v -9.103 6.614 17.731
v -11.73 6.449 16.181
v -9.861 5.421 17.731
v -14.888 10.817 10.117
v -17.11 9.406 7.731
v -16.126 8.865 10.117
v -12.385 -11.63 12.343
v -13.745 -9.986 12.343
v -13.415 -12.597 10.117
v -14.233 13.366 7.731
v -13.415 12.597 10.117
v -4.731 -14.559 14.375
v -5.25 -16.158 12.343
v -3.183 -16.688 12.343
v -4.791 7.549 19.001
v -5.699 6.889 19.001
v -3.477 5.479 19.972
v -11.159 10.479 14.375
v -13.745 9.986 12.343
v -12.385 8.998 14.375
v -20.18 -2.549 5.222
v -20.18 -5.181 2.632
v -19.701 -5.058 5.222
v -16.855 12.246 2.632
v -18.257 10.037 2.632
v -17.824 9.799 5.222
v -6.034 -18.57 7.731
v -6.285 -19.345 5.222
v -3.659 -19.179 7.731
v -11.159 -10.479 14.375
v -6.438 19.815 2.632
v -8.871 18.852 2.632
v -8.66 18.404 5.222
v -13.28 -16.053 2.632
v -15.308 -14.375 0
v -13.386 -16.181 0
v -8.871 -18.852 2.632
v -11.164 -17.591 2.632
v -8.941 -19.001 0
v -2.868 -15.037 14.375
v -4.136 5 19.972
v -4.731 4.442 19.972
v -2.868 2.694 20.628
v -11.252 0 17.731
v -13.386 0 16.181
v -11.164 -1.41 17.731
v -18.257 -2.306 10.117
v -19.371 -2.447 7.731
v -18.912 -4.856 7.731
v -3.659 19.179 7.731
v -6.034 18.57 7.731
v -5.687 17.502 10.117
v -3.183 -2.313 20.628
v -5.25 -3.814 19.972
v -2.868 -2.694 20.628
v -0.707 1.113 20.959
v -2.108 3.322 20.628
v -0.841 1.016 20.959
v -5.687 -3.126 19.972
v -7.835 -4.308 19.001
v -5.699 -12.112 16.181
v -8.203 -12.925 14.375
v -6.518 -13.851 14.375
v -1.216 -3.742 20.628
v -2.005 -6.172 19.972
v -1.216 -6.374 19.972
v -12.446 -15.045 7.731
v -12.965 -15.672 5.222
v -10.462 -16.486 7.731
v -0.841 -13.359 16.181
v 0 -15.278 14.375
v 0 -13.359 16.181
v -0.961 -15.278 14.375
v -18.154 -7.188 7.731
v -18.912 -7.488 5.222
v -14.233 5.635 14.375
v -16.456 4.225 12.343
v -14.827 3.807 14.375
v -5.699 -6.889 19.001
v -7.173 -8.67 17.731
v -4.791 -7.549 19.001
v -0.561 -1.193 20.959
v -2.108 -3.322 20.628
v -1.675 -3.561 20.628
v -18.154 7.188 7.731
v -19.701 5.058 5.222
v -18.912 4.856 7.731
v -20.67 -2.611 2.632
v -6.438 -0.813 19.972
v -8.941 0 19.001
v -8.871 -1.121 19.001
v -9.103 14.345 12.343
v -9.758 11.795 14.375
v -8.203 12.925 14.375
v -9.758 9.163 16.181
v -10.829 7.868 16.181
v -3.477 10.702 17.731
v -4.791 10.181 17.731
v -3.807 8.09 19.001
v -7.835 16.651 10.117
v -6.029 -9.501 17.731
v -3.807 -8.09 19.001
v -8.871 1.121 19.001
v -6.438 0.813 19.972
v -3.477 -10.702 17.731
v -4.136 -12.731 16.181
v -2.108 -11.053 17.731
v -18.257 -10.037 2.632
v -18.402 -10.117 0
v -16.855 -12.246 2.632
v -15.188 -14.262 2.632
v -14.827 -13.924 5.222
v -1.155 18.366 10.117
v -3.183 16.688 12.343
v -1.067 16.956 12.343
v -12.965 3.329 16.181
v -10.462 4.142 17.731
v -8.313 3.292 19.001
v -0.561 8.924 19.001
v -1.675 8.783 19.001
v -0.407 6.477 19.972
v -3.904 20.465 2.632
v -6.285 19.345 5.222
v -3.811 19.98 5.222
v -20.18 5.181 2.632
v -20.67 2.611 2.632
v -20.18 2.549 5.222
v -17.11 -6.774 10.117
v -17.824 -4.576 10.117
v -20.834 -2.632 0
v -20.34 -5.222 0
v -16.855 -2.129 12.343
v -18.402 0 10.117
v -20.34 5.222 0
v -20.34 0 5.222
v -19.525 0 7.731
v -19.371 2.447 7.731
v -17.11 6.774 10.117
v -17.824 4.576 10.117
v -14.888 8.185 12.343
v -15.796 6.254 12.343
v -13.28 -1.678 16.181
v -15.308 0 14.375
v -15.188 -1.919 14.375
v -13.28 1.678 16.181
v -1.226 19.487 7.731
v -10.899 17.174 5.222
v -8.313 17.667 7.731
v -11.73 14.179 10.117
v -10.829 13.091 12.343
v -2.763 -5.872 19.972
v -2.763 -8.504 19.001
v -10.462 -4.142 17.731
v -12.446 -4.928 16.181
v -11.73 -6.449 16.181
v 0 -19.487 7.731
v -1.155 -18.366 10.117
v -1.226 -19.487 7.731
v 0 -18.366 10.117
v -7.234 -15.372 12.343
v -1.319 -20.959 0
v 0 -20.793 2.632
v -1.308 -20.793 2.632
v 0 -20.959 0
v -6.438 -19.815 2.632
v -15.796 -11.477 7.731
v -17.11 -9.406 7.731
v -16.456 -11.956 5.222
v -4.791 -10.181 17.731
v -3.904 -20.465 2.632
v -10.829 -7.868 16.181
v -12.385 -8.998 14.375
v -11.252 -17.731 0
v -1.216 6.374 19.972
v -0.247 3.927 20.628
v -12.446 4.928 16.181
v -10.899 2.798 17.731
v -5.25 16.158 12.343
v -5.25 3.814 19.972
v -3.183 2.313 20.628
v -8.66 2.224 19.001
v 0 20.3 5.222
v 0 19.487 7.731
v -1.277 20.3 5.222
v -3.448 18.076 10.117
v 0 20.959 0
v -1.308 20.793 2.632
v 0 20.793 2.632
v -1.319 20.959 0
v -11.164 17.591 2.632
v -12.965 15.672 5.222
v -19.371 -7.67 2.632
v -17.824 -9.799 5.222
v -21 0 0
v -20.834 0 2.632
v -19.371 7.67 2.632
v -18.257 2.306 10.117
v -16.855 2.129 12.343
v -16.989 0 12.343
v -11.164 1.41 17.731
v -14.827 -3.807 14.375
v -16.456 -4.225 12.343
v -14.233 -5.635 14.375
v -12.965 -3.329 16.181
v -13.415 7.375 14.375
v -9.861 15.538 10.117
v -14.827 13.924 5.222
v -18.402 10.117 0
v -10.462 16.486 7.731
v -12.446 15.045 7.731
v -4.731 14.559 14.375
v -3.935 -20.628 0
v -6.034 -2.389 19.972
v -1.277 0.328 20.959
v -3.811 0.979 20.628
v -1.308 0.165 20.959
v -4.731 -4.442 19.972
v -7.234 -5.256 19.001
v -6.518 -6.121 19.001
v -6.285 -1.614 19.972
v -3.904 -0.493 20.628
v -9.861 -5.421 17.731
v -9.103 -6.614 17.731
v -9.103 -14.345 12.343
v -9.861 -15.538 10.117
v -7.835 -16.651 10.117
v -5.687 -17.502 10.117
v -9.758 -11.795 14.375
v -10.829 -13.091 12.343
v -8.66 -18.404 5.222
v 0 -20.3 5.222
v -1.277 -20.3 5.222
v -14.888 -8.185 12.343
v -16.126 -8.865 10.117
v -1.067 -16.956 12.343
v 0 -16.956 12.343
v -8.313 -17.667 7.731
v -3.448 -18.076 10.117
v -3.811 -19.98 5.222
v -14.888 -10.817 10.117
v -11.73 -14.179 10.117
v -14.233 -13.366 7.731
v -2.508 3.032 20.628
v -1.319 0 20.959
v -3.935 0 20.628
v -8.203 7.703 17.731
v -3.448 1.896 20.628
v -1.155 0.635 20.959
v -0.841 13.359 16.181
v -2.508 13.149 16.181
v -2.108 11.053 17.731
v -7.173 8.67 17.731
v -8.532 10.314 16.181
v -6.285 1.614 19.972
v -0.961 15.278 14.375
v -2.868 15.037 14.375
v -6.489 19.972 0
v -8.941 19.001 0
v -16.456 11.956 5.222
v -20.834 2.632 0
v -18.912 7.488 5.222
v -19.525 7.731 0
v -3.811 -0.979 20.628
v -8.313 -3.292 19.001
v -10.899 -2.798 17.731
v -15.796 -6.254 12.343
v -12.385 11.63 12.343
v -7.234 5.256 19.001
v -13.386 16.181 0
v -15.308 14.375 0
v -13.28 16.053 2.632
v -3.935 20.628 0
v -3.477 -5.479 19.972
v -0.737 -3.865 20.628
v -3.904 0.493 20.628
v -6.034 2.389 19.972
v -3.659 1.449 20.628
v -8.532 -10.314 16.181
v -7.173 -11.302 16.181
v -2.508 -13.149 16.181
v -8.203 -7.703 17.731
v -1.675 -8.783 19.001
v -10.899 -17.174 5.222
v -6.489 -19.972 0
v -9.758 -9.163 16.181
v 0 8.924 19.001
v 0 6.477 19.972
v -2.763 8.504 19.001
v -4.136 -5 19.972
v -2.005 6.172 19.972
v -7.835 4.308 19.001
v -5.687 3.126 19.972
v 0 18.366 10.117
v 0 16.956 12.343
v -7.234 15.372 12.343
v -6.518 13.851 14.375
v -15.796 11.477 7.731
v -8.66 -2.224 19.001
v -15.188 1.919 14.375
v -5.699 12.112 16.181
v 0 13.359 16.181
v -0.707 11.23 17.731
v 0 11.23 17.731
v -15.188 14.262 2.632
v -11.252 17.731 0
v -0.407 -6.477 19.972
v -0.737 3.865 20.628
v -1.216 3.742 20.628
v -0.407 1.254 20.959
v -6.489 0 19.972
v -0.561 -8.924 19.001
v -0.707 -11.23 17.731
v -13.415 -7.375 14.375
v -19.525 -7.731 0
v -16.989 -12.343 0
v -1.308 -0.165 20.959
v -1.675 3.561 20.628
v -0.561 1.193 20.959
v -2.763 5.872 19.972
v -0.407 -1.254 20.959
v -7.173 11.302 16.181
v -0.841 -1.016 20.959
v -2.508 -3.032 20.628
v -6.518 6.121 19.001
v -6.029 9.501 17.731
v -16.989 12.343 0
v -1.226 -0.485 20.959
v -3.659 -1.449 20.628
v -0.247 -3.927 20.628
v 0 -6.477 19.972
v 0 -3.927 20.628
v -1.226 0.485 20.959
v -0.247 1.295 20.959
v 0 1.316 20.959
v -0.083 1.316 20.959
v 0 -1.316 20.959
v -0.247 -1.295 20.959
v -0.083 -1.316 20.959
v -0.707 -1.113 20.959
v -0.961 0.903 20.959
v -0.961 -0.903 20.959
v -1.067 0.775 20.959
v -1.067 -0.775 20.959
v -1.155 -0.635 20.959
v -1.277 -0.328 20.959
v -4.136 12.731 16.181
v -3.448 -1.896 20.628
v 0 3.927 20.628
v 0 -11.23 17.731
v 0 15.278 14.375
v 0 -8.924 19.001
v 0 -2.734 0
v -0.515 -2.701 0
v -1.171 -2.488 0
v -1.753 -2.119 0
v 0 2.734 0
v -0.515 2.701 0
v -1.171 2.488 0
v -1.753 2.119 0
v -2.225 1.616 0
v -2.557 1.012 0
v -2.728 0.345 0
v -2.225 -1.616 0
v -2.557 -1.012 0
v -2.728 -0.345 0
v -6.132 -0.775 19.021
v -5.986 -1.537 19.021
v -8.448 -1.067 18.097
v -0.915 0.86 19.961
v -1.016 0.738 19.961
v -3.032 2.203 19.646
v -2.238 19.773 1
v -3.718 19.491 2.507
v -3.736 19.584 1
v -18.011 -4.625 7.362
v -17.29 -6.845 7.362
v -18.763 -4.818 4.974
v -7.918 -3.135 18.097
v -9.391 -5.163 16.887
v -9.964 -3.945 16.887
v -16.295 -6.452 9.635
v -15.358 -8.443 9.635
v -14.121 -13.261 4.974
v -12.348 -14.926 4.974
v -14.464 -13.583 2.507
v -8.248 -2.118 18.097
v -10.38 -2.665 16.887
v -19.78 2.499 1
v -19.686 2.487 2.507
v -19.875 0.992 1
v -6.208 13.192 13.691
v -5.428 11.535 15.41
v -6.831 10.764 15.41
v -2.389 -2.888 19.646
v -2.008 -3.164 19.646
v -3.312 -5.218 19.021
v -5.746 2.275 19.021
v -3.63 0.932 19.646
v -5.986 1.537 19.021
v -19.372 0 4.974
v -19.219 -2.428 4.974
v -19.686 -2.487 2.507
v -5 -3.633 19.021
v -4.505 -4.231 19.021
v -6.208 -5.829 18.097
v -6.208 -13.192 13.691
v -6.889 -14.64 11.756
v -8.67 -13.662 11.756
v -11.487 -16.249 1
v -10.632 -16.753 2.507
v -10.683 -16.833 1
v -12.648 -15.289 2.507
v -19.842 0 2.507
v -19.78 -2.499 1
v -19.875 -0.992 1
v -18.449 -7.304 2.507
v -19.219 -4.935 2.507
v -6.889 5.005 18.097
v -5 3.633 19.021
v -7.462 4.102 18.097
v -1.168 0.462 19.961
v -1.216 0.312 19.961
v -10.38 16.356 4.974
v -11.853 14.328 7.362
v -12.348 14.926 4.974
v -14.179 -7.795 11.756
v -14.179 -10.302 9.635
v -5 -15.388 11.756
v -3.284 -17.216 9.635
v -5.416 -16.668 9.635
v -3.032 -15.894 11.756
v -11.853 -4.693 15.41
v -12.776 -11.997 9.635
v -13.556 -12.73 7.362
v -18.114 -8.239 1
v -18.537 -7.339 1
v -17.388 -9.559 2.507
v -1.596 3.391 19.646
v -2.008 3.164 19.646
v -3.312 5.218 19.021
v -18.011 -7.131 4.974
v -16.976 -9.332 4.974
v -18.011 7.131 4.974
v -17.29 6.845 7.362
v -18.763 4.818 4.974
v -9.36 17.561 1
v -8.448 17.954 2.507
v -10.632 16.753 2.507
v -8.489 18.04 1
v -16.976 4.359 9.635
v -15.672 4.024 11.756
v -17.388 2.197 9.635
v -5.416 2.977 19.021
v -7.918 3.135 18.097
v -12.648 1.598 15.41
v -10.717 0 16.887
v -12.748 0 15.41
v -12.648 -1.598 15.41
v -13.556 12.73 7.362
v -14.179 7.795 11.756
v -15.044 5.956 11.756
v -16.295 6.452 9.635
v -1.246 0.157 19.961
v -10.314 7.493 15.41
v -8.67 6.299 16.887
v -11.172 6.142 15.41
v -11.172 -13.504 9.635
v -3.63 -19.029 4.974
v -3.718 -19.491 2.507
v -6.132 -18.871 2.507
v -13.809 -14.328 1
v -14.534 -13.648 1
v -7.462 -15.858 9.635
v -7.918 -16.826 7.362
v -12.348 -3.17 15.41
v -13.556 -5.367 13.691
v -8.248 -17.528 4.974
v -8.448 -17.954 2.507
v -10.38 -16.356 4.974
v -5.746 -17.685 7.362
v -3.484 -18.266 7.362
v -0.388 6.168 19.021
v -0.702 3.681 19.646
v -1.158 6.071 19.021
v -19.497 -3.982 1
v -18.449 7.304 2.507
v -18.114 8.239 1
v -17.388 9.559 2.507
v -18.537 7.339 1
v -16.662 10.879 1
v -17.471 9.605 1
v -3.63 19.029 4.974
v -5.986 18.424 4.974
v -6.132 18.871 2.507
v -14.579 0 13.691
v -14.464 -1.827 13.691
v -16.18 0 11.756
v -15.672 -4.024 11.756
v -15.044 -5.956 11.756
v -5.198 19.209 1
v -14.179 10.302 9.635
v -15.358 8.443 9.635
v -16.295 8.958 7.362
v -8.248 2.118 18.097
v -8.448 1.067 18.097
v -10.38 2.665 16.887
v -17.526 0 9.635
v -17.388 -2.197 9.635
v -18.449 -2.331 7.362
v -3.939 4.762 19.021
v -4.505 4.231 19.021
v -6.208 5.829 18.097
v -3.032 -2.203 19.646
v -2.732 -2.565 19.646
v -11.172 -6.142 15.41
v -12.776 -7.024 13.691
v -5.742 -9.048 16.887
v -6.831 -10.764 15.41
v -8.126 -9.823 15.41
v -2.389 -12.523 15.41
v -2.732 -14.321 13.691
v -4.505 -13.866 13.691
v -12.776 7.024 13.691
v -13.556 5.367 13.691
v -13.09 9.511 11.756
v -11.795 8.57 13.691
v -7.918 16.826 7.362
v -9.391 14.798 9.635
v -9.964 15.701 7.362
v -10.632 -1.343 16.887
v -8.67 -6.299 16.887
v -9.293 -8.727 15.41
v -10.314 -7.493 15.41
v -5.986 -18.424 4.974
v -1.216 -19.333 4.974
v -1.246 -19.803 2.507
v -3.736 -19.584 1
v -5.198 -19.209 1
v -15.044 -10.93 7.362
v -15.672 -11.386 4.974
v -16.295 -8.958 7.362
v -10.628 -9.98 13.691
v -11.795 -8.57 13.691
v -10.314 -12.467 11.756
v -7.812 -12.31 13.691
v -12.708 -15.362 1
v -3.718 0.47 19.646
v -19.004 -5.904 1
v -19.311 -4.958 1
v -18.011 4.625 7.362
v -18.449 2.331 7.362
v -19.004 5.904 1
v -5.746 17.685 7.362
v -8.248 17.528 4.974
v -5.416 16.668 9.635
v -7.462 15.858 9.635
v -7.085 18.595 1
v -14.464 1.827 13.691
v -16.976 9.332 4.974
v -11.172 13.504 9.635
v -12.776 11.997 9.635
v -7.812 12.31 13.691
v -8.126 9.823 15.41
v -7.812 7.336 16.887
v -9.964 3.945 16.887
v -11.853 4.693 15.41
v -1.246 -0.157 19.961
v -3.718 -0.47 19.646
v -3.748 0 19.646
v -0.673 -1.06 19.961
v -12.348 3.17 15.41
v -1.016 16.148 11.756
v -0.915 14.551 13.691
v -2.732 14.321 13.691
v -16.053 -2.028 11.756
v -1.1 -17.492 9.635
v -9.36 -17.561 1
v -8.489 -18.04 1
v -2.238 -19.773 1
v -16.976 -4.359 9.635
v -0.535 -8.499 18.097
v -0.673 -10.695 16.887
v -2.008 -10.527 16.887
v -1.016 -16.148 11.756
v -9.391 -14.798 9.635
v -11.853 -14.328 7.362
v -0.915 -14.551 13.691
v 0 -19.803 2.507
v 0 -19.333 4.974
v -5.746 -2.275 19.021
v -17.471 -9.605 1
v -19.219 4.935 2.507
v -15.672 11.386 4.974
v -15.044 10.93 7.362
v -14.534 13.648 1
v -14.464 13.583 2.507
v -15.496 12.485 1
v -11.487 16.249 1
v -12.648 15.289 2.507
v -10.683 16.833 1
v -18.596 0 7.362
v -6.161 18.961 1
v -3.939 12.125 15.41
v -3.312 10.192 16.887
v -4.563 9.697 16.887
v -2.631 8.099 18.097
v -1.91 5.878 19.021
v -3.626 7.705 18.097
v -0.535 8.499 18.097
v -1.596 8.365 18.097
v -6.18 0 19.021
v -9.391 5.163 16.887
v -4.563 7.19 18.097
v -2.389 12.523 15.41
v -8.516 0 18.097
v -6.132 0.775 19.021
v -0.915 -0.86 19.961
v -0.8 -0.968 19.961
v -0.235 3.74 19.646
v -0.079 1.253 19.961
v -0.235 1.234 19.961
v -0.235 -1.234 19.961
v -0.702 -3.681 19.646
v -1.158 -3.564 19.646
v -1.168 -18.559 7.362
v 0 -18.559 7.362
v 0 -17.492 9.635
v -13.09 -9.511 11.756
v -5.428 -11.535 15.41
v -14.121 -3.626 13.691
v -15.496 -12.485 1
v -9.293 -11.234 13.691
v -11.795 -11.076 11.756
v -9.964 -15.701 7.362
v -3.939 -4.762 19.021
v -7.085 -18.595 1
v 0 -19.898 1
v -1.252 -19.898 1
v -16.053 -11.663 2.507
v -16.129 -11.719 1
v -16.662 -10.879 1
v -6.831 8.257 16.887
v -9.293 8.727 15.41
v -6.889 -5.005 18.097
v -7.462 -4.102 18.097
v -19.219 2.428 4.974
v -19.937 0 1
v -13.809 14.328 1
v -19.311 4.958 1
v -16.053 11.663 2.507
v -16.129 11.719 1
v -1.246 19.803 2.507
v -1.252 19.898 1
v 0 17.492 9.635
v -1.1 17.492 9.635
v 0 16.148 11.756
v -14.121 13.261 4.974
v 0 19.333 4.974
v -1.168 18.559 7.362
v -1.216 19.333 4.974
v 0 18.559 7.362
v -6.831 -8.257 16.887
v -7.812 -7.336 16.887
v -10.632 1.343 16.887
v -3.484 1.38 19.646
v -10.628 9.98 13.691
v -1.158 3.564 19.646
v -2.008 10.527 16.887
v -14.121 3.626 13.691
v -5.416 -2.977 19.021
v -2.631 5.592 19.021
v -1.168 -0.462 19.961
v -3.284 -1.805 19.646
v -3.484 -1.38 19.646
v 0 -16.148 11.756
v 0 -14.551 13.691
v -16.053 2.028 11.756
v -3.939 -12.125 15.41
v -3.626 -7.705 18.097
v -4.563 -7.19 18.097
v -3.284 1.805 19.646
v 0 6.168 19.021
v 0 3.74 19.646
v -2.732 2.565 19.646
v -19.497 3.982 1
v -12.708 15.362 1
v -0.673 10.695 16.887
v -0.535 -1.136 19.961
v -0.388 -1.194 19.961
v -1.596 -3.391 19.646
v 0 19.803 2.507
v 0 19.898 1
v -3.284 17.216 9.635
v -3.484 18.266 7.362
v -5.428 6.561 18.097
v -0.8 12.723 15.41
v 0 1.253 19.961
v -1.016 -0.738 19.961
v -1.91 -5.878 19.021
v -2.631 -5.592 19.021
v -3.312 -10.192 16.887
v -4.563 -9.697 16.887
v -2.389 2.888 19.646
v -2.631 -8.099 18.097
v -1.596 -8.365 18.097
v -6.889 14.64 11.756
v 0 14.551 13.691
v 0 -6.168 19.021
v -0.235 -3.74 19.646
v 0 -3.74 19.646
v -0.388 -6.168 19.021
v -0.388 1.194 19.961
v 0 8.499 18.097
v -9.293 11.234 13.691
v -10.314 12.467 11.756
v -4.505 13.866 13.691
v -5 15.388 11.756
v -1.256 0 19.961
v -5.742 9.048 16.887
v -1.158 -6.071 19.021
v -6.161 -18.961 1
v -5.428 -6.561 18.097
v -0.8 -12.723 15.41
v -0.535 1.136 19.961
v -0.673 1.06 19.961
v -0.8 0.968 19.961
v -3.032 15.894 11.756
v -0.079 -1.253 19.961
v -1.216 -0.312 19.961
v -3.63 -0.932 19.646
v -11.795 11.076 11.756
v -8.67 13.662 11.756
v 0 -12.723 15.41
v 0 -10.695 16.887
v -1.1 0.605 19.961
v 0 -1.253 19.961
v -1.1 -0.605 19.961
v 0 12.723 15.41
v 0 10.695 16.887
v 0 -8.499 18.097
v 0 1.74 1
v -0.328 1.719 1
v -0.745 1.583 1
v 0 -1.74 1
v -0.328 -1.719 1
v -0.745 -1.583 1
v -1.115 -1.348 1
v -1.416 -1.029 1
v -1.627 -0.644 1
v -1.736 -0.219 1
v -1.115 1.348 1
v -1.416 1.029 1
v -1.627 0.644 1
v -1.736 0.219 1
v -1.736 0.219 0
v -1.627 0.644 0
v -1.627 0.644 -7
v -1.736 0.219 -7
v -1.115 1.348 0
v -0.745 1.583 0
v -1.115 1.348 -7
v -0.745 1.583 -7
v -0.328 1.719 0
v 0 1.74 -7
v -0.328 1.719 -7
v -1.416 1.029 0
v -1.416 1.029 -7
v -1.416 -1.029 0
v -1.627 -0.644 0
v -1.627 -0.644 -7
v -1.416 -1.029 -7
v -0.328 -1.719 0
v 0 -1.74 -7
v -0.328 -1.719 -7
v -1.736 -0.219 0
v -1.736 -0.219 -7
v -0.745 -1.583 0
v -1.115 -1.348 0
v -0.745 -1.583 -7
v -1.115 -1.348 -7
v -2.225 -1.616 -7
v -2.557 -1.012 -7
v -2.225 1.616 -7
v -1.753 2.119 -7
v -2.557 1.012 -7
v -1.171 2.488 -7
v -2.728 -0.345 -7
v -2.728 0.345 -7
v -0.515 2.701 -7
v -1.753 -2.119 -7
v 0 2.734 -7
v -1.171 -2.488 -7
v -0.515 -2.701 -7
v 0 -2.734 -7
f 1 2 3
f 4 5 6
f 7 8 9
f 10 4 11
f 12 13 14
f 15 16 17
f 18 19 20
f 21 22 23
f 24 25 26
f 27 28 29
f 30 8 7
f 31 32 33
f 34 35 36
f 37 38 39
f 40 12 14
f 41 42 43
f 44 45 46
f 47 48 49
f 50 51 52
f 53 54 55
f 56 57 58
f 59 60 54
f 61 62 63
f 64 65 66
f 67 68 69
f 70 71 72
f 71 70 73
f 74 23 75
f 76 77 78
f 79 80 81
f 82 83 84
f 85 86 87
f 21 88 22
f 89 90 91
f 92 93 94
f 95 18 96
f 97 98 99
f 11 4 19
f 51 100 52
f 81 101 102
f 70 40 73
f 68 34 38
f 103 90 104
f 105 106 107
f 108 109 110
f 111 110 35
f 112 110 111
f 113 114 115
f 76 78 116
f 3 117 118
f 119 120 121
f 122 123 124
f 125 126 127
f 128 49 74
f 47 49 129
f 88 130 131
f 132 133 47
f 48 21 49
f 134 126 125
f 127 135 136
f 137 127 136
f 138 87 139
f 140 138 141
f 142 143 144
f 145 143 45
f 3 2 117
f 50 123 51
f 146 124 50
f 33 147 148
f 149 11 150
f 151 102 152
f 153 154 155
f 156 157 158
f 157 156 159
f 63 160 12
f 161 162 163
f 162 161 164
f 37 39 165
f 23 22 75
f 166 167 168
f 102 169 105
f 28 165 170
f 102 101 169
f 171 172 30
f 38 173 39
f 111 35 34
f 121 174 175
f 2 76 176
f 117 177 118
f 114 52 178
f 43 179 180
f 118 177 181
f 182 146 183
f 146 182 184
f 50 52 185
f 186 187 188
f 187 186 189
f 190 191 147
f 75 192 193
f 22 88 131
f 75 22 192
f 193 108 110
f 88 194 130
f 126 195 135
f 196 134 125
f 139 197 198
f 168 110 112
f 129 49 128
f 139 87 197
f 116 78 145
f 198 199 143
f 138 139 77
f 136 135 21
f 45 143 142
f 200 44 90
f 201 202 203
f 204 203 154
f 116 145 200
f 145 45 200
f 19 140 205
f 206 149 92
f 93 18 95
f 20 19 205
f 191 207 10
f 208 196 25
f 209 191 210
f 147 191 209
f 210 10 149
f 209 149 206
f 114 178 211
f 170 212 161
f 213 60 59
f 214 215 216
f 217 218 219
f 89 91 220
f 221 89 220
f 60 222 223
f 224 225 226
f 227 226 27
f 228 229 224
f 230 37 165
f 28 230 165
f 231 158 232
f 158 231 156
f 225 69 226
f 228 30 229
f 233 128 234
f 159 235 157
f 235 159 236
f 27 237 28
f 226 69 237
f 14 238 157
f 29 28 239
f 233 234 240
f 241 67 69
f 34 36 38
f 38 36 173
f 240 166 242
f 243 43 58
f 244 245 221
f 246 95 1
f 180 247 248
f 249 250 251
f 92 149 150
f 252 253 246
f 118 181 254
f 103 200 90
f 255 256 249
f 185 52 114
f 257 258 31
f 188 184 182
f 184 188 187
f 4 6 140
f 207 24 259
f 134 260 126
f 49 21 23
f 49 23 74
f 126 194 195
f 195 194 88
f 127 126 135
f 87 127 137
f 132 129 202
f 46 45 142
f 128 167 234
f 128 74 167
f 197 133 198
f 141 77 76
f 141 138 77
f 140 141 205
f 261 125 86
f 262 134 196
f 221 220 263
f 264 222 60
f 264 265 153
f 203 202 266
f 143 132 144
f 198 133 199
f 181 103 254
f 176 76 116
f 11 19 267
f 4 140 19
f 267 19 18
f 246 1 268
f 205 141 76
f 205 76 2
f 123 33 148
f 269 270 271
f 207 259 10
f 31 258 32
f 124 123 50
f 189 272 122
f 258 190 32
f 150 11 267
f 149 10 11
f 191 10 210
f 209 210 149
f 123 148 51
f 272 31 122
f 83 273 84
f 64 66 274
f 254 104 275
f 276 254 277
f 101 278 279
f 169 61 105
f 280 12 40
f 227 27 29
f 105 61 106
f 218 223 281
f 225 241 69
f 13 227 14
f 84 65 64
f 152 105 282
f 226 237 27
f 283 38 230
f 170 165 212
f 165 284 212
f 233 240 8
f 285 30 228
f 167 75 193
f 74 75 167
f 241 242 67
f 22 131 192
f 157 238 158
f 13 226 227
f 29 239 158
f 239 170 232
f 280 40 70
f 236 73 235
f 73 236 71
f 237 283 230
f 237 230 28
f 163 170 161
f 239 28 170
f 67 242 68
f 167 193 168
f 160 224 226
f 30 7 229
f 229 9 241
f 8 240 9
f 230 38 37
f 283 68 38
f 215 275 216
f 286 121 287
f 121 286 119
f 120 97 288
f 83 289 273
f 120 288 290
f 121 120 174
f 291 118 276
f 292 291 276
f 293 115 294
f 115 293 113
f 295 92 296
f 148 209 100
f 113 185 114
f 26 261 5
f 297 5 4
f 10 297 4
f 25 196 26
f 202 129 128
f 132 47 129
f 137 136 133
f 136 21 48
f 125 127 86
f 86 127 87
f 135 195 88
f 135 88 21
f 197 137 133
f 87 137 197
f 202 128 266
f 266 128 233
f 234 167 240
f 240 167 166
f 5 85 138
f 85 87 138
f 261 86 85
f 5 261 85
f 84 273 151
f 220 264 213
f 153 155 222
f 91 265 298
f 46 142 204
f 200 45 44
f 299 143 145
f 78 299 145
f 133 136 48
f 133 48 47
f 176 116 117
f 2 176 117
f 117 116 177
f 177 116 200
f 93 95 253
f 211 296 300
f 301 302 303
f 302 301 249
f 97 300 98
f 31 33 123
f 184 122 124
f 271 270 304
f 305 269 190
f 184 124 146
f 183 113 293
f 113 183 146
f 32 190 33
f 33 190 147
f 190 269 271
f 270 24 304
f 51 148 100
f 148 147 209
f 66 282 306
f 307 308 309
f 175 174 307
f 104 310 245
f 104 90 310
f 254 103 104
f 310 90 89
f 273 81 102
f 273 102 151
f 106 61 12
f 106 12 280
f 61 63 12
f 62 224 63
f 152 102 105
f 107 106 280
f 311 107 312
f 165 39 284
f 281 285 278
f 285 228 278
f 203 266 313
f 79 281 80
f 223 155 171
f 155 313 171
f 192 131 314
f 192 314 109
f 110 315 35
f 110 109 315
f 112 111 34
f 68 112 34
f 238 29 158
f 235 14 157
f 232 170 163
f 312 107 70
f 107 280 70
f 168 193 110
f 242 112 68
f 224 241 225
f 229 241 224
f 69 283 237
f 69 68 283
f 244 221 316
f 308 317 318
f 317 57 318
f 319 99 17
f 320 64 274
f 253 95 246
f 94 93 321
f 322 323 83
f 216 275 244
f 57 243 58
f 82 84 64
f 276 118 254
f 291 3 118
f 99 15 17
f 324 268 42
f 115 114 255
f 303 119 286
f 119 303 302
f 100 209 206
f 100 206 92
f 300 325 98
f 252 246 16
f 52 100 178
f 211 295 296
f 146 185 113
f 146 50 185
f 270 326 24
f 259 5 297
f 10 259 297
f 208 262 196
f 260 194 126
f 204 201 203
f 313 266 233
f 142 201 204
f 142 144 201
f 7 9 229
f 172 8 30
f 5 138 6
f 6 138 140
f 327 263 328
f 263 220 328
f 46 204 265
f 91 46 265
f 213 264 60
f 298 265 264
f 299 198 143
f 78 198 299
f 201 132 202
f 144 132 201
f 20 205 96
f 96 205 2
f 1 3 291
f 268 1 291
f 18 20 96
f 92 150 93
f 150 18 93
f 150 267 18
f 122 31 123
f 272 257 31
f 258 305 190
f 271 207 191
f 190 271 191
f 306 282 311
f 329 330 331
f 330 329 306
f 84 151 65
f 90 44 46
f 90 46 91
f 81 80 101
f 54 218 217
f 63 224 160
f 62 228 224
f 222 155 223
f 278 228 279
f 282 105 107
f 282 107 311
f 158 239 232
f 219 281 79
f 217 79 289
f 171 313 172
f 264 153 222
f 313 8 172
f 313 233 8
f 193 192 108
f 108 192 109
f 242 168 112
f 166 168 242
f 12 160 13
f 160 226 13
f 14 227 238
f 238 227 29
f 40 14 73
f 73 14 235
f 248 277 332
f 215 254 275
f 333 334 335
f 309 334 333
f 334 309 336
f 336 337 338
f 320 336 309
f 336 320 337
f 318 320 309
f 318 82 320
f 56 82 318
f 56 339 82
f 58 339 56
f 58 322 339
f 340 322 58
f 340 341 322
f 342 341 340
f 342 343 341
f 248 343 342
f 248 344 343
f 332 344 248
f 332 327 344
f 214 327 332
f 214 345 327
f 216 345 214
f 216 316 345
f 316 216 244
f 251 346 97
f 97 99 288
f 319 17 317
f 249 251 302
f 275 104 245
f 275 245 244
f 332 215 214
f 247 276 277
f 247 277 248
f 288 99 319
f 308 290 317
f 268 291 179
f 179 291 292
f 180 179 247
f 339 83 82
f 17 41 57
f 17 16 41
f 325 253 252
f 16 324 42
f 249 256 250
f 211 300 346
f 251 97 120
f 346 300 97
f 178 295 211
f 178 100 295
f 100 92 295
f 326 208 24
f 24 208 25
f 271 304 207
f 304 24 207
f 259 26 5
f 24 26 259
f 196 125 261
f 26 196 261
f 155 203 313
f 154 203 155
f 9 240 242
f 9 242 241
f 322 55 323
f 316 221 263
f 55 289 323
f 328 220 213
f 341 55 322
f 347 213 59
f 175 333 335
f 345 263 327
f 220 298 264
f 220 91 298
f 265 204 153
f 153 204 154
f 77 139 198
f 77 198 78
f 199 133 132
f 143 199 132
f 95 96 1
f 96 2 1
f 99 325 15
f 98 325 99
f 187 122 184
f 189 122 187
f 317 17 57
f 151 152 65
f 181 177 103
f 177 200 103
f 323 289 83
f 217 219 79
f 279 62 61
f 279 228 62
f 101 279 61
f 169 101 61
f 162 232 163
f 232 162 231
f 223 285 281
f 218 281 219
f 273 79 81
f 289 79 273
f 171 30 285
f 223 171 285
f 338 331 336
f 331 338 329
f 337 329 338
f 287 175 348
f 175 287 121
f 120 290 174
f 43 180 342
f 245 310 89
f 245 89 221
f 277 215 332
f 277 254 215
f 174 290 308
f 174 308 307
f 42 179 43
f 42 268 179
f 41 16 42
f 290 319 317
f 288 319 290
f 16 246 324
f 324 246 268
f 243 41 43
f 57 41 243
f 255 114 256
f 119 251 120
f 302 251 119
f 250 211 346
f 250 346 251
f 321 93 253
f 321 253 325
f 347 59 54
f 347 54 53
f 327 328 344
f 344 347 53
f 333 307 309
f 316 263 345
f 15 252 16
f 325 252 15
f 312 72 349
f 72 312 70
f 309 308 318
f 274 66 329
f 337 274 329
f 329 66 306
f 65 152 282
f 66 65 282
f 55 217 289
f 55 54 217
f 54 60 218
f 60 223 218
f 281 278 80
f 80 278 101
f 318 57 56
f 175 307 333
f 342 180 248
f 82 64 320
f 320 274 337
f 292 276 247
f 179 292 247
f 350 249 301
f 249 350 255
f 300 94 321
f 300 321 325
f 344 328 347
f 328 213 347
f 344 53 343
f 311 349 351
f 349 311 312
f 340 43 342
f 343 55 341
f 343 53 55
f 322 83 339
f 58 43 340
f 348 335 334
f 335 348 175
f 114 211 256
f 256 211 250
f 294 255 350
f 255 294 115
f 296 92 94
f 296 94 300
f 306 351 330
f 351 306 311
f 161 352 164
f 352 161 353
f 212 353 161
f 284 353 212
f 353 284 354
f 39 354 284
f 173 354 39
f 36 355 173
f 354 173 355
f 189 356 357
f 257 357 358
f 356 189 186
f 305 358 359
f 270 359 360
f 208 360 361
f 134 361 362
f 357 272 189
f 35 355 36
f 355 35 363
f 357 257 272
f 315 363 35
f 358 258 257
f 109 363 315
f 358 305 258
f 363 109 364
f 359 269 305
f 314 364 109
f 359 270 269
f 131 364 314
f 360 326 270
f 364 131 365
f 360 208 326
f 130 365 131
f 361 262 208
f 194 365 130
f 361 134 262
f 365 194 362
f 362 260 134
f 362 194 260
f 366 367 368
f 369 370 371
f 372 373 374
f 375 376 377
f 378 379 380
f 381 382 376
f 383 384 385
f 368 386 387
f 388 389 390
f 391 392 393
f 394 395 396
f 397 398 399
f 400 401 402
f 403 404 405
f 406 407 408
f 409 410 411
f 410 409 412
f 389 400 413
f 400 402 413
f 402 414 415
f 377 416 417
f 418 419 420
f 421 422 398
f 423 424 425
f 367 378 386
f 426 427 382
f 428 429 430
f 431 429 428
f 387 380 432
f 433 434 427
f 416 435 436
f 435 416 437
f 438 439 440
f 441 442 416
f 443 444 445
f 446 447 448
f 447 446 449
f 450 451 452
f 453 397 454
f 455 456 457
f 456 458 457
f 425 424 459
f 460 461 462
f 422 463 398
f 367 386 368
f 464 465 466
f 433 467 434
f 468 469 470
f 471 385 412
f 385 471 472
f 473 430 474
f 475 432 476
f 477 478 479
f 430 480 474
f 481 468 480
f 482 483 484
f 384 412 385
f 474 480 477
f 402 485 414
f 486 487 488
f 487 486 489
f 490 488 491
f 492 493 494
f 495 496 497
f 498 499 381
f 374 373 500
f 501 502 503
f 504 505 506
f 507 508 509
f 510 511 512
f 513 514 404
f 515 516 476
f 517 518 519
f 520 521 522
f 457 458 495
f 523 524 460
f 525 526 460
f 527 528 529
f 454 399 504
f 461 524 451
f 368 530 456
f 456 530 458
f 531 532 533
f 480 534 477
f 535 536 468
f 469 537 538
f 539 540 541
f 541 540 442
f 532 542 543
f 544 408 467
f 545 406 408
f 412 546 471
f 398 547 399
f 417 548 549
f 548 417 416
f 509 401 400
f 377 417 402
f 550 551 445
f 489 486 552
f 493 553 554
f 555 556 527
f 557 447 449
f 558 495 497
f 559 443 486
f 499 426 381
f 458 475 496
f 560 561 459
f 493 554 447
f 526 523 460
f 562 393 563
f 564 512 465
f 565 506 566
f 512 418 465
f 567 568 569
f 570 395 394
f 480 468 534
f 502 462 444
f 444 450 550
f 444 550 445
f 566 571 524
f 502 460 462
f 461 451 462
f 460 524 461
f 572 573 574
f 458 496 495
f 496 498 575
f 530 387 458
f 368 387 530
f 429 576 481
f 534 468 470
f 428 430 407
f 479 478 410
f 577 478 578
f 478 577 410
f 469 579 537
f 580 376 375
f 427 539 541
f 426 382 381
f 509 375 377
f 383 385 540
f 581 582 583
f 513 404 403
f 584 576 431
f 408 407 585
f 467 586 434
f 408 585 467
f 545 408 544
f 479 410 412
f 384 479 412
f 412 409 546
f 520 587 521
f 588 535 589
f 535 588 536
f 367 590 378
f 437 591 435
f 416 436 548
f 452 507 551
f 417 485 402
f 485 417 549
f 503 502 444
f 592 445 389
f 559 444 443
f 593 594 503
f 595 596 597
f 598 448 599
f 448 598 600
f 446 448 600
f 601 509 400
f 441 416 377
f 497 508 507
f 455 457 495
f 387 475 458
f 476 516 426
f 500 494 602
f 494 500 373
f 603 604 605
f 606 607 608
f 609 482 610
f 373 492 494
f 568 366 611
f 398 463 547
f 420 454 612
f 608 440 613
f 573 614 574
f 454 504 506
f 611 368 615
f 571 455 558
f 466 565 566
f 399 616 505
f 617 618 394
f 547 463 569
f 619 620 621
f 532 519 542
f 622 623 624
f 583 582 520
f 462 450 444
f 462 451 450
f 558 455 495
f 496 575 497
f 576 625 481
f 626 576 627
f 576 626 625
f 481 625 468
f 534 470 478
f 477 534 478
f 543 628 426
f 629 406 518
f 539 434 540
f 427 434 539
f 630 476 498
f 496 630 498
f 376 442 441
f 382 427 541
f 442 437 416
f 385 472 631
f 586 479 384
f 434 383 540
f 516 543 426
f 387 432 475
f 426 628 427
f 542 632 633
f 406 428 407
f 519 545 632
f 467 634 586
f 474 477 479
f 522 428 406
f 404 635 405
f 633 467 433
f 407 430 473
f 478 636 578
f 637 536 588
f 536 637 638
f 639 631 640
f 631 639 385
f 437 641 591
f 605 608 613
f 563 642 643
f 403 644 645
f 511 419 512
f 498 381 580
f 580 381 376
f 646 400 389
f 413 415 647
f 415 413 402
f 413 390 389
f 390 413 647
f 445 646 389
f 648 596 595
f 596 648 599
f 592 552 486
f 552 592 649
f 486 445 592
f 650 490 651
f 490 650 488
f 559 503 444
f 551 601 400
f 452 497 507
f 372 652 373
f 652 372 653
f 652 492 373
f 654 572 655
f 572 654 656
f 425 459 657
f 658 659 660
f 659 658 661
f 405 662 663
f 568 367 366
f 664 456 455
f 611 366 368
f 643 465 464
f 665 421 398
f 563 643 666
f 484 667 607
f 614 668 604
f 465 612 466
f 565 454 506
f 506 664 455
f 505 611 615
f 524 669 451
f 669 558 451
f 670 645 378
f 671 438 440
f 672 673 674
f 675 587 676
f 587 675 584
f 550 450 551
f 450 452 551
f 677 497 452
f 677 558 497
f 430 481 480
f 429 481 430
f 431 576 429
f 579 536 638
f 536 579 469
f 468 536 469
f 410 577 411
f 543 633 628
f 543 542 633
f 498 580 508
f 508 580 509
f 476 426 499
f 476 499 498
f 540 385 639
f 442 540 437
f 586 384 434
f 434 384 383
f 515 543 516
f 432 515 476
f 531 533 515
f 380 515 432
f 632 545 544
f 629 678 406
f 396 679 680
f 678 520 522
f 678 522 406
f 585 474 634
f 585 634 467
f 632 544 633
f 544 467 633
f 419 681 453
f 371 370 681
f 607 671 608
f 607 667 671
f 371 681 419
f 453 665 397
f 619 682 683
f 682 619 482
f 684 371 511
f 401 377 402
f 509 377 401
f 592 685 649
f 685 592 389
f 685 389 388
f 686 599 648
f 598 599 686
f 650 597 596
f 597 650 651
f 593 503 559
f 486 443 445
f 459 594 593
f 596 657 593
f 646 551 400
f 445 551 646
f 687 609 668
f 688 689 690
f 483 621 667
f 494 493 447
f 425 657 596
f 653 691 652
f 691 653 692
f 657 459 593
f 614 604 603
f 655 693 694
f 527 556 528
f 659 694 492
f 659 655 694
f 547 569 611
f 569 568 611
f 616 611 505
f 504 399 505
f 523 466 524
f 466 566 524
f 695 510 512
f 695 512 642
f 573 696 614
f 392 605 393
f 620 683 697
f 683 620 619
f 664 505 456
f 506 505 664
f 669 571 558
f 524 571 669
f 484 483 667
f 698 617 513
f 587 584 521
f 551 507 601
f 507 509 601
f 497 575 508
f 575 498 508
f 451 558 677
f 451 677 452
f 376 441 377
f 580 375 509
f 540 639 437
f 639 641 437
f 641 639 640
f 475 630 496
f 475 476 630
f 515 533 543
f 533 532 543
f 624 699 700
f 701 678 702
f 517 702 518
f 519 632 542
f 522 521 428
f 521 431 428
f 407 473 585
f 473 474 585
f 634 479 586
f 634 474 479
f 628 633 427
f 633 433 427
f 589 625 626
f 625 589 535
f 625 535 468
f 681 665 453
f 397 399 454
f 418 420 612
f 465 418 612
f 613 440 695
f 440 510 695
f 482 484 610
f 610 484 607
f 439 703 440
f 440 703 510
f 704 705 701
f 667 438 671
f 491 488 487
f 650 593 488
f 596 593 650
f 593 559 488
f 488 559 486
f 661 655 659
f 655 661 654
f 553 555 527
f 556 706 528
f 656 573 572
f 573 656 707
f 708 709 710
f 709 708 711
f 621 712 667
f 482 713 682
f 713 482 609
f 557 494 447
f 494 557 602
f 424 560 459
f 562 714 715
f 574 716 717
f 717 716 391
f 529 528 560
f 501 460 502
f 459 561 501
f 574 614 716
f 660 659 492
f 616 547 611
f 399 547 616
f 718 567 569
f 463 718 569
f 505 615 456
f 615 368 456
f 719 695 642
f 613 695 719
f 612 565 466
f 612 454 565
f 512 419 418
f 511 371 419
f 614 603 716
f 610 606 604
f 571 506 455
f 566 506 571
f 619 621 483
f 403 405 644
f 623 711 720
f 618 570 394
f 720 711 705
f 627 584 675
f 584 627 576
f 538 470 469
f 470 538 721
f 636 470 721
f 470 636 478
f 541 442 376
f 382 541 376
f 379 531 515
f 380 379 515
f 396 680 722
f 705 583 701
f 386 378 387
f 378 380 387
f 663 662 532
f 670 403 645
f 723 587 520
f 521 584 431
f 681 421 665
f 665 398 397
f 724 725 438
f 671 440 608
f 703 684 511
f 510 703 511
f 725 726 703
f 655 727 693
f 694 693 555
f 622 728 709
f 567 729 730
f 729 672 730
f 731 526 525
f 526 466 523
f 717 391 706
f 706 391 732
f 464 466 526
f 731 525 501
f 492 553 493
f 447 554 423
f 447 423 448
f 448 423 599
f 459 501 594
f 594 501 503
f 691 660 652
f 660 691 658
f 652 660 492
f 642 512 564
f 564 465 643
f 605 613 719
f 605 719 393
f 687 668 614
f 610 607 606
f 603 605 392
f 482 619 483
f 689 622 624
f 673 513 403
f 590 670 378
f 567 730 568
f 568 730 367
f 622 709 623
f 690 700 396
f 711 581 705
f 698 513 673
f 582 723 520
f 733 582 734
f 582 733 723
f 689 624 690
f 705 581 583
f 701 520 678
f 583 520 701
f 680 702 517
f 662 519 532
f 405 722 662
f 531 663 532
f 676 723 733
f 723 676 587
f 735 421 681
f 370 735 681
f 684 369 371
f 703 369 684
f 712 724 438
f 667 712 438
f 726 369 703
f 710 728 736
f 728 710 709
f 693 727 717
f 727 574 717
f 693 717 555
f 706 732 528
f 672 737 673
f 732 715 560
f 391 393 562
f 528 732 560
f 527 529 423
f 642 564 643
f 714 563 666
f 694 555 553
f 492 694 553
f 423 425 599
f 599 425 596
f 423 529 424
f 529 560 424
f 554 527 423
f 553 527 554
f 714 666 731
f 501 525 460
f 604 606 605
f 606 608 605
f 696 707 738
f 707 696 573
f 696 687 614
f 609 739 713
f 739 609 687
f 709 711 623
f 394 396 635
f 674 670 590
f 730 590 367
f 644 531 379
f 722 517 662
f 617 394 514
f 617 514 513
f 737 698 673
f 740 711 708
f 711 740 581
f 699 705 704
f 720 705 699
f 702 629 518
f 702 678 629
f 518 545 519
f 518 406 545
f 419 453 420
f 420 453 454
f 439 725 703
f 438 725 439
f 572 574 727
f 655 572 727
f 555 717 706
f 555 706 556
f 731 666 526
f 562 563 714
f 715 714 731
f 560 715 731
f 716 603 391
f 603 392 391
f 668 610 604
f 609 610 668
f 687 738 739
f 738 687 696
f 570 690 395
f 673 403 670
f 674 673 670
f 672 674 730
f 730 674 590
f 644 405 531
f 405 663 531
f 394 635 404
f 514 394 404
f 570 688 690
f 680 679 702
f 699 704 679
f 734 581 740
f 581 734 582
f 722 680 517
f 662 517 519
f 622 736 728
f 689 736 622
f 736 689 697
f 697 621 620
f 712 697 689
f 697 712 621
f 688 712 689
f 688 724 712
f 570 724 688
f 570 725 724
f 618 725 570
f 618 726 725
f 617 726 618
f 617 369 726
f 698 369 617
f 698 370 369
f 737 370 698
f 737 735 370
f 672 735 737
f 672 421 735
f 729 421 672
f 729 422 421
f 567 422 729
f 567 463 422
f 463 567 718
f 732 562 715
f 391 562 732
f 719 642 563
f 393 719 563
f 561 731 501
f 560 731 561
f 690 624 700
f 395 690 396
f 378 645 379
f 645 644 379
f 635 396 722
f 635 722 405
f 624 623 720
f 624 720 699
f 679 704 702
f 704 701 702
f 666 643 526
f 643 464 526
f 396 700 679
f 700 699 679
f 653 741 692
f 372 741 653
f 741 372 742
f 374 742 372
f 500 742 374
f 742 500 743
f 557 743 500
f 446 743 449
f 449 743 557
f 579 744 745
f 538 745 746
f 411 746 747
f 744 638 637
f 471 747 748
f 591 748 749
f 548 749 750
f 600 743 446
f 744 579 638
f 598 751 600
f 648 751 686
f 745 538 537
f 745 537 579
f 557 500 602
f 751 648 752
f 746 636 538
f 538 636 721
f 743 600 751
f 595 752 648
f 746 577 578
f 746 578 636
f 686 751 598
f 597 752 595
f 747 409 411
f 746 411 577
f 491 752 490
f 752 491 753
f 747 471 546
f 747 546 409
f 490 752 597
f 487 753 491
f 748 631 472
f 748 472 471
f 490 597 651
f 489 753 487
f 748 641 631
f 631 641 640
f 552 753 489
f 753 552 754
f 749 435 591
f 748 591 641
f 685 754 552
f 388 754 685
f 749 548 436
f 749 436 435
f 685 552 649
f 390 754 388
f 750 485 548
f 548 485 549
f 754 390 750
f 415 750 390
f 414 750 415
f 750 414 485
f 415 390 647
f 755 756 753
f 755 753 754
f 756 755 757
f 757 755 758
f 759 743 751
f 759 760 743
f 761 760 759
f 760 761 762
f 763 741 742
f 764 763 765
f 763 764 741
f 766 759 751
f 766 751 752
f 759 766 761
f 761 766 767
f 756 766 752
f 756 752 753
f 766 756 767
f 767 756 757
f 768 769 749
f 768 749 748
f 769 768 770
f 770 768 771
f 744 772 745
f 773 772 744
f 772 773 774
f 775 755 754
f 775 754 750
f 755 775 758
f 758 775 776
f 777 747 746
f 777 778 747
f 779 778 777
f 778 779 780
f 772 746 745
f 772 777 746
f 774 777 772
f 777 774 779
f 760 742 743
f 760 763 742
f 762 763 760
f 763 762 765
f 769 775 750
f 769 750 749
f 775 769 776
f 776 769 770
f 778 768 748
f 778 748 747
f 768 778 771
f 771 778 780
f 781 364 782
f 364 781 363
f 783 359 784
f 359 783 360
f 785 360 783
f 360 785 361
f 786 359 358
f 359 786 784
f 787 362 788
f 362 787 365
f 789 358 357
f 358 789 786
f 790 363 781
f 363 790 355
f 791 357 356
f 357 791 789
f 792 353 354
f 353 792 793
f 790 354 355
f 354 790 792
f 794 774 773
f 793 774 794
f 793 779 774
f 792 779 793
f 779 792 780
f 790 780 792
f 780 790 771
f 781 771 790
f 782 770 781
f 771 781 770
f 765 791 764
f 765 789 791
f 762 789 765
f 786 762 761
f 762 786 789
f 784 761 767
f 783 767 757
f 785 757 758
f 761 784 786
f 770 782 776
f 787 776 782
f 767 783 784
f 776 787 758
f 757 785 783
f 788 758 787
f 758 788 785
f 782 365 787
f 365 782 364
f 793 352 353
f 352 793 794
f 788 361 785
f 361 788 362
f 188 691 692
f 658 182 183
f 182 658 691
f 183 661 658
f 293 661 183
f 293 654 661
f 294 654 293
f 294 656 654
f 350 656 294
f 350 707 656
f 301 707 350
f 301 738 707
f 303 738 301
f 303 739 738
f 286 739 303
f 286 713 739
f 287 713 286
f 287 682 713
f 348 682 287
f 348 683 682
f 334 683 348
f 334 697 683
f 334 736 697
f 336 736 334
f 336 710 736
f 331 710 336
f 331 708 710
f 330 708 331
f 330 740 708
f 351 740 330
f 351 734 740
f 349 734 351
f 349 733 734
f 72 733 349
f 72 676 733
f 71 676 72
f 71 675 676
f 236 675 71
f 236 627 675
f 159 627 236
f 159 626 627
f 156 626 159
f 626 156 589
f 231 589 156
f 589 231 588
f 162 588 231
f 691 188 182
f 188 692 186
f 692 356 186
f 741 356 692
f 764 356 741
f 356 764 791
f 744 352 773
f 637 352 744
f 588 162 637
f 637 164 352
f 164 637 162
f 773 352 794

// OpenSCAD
cap_radius = 20;
cable_radius = 1.75;
clamp_height = 7;
thickness = 1;

module cap(rad) {
        difference() {
        sphere(r=rad, $fn=50);
        translate([0, 0, -(rad/2)]) {
            cube([rad*2, rad*2, rad], center=true);
        }
    }
}

module thick_cap(rad, thk) {
    difference() {
        cap(rad + thk);
        difference() {
            cap(rad);
            translate([0, 0, -(rad/2)+thk]) {
                cube([rad*2, rad*2, rad], center=true);
            }
        }
    }
}

module cable(h, r, t) {
    translate([0, 0, -(h/2)+(t*.5)]) {
        cylinder(h=h+(3*t), r=r, center=true, $fn=25);
    }
}

module clamp(h, r, t) {
    translate([0, 0, -(h/2)]) {
        cylinder(h=h, r=r+t, center=true, $fn=25);
    }
}

module cut(r, h, t) {
    translate([(r/2)+t, 0, (r-h)/2]) {
        cube([r+(t*2), (r*2)+(t*2), (t*2)+r+h], true);
    }
}

module component(cap_rad, cab_rad, h, t) {
    
    difference() {
        union() {
            difference() {
                thick_cap(cap_rad, t);
                cable(h, cab_rad, t);
            }
            difference() {
                clamp(h, cab_rad, t);
                cable(h, cab_rad, t);
            }
        }
        cut(cap_radius, clamp_height, thickness);
    }
}

component(cap_radius, cable_radius, clamp_height, thickness);
